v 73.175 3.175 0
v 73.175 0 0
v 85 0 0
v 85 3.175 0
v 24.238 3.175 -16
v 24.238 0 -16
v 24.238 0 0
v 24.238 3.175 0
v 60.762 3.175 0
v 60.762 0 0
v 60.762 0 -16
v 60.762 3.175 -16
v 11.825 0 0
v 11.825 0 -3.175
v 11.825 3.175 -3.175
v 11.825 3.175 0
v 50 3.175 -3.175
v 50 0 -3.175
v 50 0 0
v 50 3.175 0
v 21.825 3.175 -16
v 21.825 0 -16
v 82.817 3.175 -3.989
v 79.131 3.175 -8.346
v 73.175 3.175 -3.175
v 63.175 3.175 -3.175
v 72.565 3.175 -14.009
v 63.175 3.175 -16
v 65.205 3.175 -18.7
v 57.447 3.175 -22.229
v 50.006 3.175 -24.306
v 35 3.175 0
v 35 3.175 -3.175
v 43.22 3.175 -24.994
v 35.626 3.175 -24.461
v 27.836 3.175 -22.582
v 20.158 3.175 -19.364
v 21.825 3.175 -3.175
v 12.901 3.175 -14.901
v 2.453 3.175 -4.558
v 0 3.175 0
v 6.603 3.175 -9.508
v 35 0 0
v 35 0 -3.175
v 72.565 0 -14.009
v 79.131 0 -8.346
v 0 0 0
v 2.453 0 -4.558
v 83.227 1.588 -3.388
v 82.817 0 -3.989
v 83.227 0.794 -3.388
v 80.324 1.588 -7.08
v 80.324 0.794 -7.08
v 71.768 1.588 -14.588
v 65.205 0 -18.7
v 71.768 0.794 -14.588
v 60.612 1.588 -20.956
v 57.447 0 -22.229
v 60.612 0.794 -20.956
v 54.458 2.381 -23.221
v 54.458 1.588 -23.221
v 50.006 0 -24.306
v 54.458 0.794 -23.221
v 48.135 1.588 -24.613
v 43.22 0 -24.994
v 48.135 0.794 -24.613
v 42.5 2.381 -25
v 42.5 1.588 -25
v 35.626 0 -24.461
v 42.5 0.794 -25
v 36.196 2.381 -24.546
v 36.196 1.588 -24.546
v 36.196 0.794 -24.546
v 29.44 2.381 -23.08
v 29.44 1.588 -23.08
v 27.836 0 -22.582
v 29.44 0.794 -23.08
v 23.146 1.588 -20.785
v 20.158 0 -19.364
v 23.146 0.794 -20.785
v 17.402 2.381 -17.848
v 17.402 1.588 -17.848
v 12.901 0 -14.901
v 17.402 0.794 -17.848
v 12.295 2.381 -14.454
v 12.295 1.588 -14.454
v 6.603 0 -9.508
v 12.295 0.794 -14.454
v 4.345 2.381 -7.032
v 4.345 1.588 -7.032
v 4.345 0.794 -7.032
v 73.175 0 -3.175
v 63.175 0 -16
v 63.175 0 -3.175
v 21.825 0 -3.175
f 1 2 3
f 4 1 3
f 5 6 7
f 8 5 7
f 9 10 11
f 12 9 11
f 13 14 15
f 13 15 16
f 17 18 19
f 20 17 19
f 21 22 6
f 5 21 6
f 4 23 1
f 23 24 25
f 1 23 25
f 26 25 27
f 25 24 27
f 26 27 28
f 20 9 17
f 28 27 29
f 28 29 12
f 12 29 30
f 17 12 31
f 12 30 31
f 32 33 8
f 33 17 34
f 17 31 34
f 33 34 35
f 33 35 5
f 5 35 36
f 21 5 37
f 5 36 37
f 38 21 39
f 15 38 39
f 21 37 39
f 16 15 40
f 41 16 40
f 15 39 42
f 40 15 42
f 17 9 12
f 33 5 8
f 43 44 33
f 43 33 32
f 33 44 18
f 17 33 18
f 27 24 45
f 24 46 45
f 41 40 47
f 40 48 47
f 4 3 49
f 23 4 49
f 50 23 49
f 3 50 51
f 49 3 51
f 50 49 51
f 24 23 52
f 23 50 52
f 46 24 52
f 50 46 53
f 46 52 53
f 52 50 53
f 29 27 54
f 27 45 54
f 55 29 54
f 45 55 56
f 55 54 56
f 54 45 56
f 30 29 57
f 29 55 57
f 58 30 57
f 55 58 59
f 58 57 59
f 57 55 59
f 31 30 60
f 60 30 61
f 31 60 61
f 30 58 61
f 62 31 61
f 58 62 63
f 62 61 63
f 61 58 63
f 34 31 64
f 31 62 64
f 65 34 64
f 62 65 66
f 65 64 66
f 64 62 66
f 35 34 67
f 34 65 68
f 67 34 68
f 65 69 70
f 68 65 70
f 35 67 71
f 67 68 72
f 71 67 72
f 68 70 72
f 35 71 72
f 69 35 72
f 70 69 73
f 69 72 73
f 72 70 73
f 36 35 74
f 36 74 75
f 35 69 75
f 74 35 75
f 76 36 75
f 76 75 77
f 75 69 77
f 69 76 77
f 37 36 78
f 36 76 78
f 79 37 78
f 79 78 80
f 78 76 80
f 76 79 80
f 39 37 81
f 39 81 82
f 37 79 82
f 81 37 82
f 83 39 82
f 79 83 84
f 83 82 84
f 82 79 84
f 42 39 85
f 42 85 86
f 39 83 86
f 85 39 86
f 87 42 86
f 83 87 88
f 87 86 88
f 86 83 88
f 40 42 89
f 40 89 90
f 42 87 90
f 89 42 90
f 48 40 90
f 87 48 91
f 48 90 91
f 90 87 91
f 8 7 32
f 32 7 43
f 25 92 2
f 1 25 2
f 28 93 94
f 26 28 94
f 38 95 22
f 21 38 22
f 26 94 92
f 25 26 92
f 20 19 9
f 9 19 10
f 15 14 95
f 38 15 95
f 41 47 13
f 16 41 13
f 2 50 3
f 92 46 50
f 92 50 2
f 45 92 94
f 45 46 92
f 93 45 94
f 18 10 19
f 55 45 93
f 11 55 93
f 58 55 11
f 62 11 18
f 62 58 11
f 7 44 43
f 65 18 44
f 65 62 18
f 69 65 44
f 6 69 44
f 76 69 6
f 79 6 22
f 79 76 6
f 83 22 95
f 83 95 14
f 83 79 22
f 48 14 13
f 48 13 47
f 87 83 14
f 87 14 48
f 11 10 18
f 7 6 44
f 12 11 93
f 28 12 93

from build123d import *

# Parameters (mm, degrees)
BOSS_EXTRUDE1_DEPTH = 3.175
SKETCH2_W           = 10
SKETCH2_H           = 3.175
SKETCH2_W_2         = 15
CUT_EXTRUDE1_DEPTH  = 4.1750001


with BuildPart() as part:
    # Sketch1 → Boss-Extrude1 (new body)
    with BuildSketch(Plane(origin=(0, 0, 0), x_dir=(1, 0, 0), z_dir=(0, 1, 0))):
        with BuildLine():
            add(Edge.make_bspline(
                [(0, 0), (3.07818129, 8.457233587), (19.262118608, 23.397882677), (40.36741362, 25), (42.5, 25)],
                knots=[0, 0, 0, 0, 0.479831935, 0.533146595, 0.533146595, 0.533146595, 0.533146595], degree=3))
            Line((0, 0), (42.5, 0))
            Line((42.5, 0), (42.5, 25))
        make_face()
        with BuildLine():
            Line((42.5, 25), (42.5, 0))
            Line((42.5, 0), (85, 0))
            add(Edge.make_bspline(
                [(42.5, 25), (44.36741362, 25), (63.21067639, 23.77153695), (81.92181871, 8.457233587), (85, 0)],
                knots=[0.533146595, 0.533146595, 0.533146595, 0.533146595, 0.579831935, 1, 1, 1, 1], degree=3))
        make_face()
    extrude(amount=BOSS_EXTRUDE1_DEPTH)

    # Sketch2 → Cut-Extrude1 (cut, through all)
    with BuildSketch(Plane.XZ):
        with Locations((68.175, -1.5875)):
            Rectangle(SKETCH2_W, SKETCH2_H)
        Polygon((60.762, 0), (60.762, -16), (63.175, -16), (63.175, -3.175), (63.175, 0), align=None)
        with Locations((42.5, -1.5875)):
            Rectangle(SKETCH2_W_2, SKETCH2_H)
        Polygon((24.238, -16), (24.238, 0), (21.825, 0), (21.825, -3.175), (21.825, -16), align=None)
        with Locations((16.825, -1.5875)):
            Rectangle(SKETCH2_W, SKETCH2_H)
    extrude(amount=-CUT_EXTRUDE1_DEPTH, mode=Mode.SUBTRACT)


solid = part.part
